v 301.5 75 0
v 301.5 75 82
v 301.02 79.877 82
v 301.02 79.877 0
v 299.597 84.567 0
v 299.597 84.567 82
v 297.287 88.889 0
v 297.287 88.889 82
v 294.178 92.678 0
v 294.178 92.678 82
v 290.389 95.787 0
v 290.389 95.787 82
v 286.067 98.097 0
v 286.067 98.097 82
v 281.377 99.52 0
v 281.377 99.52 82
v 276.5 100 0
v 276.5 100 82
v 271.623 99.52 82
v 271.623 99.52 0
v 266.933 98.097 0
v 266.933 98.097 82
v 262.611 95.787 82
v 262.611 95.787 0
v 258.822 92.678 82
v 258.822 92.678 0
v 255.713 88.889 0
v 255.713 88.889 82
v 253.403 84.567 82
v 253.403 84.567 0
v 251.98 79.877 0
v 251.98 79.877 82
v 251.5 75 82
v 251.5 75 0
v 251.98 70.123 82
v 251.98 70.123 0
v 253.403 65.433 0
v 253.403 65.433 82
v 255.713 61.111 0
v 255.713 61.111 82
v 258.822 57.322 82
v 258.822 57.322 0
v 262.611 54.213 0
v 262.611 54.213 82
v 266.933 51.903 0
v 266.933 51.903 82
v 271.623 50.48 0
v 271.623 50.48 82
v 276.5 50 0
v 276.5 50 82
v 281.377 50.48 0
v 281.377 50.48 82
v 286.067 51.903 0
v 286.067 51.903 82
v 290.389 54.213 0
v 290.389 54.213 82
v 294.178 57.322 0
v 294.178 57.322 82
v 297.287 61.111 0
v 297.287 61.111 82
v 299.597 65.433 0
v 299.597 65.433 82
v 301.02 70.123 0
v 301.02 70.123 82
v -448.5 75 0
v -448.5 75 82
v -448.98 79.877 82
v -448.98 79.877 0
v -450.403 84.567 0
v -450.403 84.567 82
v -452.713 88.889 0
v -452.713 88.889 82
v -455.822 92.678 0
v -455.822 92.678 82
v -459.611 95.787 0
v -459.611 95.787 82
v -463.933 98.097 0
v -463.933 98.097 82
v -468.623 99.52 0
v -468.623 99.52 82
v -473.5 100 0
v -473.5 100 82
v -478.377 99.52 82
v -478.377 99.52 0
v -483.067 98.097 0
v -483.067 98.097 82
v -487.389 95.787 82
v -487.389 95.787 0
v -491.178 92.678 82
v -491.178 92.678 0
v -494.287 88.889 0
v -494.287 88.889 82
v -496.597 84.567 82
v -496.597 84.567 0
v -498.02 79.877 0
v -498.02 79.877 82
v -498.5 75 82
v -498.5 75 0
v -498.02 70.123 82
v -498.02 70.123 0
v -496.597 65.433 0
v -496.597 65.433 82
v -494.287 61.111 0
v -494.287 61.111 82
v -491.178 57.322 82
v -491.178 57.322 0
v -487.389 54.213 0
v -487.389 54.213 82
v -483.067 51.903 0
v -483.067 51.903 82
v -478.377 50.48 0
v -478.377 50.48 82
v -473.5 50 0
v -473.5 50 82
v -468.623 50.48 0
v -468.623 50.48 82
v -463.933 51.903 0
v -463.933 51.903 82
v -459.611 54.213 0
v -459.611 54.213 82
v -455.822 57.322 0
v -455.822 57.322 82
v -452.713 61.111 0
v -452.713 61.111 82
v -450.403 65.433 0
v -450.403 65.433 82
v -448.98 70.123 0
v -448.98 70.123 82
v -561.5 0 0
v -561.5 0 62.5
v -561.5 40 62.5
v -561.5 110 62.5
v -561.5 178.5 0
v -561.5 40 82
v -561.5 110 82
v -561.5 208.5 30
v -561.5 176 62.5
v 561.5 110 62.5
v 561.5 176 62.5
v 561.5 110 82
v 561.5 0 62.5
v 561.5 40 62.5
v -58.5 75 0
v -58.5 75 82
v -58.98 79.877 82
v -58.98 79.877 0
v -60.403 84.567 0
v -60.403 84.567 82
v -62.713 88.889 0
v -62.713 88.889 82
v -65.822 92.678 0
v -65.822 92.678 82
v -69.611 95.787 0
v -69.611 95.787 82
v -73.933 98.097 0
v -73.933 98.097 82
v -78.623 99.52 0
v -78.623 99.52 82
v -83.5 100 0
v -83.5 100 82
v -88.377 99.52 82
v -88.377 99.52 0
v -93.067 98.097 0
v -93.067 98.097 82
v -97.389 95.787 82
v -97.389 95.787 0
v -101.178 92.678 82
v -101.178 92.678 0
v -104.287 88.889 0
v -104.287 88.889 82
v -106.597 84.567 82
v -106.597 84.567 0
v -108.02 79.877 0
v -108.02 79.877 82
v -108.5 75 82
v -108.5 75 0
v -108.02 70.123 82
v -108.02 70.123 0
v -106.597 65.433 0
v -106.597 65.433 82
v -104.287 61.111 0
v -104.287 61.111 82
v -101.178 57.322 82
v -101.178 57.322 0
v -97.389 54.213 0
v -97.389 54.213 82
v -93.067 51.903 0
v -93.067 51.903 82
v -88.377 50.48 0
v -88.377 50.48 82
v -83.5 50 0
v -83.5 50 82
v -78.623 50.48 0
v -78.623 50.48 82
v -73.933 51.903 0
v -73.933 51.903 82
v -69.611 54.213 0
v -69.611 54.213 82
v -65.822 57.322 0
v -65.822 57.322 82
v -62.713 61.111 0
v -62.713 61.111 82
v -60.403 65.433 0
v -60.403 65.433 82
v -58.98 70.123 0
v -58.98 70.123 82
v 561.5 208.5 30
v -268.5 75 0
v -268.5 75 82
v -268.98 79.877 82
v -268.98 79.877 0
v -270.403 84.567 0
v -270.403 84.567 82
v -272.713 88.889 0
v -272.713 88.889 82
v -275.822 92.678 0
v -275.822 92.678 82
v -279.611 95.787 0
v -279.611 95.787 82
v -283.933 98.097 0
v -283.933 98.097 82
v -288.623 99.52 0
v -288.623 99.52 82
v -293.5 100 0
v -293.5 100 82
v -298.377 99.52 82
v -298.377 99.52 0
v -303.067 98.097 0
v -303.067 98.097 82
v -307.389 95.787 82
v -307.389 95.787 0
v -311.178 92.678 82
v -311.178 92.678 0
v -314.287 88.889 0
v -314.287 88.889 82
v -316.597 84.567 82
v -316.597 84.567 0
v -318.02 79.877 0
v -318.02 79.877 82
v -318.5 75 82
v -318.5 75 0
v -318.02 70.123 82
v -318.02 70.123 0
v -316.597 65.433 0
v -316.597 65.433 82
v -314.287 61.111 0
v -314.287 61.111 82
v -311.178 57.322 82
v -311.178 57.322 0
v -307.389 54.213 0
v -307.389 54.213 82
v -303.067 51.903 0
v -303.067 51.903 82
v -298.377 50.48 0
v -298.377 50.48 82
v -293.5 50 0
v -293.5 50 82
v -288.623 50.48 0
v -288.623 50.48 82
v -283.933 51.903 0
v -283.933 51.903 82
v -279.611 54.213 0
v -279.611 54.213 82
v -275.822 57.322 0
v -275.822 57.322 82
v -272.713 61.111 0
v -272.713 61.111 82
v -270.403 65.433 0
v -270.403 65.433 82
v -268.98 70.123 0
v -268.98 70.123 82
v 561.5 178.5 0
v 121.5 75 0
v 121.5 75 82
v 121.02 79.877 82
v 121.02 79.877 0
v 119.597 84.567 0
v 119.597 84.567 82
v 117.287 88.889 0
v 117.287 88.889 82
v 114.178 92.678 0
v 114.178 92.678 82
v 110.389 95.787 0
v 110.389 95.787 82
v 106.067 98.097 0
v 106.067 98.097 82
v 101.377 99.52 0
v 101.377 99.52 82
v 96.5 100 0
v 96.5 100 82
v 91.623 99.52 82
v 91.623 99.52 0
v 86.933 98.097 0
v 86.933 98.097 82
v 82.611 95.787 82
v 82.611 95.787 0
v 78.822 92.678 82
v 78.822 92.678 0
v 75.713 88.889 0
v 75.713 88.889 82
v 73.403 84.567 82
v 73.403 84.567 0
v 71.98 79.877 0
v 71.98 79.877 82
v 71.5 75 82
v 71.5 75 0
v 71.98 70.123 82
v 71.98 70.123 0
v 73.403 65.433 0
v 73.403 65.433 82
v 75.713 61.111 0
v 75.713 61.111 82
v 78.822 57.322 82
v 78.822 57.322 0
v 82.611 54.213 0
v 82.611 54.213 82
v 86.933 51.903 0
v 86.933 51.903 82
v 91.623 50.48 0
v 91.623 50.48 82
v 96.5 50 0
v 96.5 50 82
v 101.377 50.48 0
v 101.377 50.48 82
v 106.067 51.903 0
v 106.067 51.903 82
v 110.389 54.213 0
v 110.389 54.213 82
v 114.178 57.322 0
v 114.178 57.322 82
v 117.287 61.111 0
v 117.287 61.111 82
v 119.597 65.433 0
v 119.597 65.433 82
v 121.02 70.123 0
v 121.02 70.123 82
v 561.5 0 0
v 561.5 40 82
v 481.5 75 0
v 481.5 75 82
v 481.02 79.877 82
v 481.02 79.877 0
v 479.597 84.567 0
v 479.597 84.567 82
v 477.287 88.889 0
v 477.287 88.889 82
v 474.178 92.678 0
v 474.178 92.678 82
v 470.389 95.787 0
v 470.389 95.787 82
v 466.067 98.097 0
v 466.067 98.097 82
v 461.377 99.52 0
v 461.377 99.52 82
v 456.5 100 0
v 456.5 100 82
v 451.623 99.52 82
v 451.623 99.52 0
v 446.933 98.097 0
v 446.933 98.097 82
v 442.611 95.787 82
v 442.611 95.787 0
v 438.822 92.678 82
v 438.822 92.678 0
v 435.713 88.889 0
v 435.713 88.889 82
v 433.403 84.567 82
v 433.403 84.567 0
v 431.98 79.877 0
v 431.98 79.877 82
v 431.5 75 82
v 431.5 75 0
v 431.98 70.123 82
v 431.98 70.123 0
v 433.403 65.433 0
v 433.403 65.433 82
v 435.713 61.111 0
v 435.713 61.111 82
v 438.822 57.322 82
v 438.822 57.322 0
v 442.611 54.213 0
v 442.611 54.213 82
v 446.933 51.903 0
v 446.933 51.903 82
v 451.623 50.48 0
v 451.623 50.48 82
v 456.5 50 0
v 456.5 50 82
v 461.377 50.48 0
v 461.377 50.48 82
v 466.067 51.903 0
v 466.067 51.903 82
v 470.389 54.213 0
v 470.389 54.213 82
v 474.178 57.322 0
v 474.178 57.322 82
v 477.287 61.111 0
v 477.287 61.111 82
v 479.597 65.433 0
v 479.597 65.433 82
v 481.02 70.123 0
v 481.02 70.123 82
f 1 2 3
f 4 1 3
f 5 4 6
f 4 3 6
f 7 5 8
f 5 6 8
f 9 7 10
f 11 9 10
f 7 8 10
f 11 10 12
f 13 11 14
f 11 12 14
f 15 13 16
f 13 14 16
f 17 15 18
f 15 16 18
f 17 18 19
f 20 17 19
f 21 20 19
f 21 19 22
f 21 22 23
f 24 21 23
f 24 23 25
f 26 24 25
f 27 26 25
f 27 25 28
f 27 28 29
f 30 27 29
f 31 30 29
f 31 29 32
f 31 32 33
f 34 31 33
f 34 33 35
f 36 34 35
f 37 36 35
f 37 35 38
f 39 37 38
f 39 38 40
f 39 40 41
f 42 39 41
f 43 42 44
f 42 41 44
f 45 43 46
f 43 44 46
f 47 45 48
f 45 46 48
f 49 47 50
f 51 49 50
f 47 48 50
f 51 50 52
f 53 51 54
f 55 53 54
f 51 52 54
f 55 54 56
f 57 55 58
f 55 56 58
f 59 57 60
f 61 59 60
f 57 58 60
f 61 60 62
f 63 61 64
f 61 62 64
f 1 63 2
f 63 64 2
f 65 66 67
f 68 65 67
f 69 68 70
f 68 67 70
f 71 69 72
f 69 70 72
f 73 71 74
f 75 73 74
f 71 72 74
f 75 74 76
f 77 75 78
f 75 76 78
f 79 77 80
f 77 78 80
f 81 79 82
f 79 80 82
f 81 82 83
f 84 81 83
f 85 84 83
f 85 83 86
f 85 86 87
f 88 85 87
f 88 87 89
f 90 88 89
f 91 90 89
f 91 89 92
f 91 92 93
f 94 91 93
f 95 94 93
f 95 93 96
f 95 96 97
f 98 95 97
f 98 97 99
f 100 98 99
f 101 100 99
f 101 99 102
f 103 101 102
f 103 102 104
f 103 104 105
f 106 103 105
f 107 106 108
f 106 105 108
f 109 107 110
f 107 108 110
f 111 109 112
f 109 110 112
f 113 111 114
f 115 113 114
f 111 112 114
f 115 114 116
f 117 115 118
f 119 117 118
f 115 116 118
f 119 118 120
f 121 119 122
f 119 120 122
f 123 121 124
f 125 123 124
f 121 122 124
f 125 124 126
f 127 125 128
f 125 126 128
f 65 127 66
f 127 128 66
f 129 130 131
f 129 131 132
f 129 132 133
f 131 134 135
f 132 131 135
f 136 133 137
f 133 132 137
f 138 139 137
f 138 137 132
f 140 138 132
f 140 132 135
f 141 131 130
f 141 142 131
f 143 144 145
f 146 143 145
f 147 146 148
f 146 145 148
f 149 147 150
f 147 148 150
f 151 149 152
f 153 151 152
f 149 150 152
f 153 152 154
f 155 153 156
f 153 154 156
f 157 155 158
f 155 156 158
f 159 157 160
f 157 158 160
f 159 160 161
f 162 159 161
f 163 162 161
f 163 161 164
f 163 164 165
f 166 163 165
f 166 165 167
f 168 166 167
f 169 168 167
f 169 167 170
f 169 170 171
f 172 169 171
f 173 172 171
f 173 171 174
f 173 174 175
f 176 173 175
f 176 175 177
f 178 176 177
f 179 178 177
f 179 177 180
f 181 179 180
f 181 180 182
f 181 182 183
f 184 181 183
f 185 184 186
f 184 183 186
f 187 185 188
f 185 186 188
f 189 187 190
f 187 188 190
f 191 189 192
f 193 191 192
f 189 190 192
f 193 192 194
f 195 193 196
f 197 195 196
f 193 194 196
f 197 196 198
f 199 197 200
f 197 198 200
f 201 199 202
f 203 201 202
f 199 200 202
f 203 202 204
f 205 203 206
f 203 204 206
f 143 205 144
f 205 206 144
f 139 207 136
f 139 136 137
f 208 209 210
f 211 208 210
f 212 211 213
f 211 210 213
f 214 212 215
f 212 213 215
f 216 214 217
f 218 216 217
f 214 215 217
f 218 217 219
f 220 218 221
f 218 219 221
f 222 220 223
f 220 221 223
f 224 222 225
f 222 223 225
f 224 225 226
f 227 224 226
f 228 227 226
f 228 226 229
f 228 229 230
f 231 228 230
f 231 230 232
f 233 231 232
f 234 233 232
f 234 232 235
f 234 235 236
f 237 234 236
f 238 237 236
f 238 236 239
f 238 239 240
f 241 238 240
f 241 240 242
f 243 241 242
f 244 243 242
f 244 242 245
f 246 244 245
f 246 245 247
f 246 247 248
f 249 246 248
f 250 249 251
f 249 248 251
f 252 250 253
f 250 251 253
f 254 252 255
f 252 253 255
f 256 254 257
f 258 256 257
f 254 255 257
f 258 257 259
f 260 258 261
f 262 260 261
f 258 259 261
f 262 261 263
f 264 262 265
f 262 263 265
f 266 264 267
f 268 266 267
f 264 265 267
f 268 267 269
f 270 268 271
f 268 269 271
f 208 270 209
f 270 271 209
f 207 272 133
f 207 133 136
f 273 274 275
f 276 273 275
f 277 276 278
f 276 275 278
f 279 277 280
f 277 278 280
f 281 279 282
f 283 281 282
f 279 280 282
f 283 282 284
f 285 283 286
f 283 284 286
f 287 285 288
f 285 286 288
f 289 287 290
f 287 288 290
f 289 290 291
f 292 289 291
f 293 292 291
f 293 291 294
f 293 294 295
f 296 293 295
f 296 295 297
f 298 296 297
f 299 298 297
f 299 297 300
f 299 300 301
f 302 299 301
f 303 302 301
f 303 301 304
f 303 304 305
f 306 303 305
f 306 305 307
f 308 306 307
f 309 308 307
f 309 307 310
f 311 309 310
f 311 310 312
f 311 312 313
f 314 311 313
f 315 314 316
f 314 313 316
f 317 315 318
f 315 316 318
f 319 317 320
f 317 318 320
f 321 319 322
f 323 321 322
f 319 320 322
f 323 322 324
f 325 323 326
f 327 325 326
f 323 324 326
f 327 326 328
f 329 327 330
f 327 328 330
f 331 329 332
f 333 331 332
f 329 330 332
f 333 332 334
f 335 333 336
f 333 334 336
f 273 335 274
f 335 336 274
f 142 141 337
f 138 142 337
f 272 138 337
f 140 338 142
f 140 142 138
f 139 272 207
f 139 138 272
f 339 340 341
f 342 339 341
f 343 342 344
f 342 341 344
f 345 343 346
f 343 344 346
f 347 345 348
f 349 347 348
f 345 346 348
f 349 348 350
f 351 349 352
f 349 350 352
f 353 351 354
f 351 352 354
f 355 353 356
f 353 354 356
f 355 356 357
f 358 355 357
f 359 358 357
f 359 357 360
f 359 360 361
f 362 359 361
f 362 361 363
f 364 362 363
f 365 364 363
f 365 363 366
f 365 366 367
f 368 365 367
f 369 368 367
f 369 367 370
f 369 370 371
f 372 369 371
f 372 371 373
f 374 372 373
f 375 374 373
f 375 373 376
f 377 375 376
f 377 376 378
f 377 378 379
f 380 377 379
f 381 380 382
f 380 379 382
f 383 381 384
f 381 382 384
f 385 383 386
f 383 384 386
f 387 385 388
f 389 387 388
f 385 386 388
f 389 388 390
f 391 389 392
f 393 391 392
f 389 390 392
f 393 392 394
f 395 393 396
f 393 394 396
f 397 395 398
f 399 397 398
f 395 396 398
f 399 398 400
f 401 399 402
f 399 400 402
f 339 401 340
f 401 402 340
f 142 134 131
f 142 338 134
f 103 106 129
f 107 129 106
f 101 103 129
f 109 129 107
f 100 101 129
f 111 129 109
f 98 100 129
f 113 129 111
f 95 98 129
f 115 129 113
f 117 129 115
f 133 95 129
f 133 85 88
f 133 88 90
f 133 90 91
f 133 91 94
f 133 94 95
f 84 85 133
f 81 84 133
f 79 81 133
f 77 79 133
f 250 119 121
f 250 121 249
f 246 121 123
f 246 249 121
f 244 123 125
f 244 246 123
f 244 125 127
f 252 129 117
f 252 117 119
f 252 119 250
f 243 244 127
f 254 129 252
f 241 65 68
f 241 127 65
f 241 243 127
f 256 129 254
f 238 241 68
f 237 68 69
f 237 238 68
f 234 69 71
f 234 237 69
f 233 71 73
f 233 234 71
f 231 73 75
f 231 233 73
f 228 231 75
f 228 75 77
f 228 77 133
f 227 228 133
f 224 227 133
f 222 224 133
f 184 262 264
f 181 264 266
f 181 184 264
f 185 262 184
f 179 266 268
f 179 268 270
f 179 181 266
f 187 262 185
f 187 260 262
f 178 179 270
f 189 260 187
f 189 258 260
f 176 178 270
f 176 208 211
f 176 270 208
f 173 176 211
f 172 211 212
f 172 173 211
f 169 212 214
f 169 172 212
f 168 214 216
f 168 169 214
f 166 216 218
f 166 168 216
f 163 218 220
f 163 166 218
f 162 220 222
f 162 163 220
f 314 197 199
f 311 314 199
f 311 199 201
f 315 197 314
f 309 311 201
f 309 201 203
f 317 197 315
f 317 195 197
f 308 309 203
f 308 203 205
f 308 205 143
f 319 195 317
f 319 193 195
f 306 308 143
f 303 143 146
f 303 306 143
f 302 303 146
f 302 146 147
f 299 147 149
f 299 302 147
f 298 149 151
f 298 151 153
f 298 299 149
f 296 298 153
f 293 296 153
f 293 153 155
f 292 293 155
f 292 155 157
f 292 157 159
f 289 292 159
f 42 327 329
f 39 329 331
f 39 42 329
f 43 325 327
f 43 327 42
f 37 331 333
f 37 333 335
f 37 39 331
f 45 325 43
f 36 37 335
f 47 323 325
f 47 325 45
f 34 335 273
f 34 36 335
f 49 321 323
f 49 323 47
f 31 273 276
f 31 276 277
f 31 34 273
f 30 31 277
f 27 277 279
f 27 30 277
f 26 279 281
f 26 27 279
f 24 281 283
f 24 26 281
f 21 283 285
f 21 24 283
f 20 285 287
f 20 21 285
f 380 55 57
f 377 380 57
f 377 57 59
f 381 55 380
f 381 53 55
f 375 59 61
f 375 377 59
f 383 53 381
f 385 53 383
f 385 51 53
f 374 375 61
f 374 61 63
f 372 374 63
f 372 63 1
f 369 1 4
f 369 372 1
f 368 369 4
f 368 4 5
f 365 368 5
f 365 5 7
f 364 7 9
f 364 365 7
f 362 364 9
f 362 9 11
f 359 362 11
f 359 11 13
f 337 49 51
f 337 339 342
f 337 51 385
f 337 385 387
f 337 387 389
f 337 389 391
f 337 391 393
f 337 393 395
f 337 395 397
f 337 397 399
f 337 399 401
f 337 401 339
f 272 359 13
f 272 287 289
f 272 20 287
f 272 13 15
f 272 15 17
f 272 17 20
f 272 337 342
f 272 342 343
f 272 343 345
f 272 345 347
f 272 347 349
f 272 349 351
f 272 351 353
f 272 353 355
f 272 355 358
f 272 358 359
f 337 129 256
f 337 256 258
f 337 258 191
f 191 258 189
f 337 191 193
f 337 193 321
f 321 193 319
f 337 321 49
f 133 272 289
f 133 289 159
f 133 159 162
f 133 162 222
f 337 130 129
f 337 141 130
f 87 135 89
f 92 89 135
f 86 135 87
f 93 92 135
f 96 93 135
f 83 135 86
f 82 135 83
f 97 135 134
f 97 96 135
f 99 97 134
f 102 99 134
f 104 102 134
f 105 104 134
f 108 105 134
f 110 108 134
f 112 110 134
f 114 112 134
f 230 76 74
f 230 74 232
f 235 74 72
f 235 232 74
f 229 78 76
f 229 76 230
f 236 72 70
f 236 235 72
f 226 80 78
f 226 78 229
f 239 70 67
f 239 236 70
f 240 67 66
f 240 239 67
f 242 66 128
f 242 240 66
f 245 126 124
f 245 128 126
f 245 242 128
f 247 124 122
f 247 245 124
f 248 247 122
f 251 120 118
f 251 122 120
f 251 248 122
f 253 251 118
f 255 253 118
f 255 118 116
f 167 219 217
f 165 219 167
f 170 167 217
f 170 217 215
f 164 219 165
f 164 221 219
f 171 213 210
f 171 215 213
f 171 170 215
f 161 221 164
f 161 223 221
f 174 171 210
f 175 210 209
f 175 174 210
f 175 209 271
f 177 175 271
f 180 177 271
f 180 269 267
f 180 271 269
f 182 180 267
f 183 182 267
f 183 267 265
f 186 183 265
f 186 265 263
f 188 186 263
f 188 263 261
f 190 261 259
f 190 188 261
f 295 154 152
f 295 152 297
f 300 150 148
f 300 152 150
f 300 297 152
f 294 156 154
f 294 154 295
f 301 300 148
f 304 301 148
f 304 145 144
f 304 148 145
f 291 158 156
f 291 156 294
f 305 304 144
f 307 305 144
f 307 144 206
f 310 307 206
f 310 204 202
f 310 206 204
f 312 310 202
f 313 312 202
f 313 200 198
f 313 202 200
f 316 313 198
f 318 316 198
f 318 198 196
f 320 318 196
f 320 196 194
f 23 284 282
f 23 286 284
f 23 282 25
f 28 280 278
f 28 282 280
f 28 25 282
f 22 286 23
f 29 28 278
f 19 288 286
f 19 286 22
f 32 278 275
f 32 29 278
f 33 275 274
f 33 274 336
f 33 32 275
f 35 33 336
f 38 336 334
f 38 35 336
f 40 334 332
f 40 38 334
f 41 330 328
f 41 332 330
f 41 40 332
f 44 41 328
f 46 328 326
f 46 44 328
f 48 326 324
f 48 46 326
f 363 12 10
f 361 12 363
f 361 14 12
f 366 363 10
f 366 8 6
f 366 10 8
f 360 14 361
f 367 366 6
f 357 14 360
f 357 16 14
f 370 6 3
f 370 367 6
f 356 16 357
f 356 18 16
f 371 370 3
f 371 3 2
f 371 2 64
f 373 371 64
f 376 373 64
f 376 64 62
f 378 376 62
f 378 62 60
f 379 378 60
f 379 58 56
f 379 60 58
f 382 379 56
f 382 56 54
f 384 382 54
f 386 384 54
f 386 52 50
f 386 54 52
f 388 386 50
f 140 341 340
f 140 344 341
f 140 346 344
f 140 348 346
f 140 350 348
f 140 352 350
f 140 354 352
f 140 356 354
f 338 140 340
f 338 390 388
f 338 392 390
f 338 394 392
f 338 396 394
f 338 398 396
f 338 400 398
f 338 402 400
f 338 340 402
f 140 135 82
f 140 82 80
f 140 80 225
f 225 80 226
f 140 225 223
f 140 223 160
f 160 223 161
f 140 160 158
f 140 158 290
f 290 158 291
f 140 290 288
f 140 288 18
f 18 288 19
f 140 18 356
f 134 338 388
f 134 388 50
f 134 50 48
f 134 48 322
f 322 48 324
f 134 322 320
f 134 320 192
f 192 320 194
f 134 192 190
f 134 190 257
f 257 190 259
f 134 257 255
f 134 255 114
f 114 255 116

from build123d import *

# Parameters (mm, degrees)
F1_DEPTH = 561.5
F2_R     = 25
F3_DEPTH = 82.001


with BuildPart() as f1:
    # F0 (on Right) → F1 (new body, symmetric)
    with BuildSketch(Plane.YZ):
        Polygon((0, 62.5), (0, 0), (178.5, 0), (208.5, 30), (176, 62.5), (110, 62.5), (110, 82), (40, 82), (40, 62.5), align=None)
    extrude(amount=F1_DEPTH, both=True)

    # F2 (on face) → F3 (cut, through all)
    with BuildSketch(Plane.XY.offset(82)):
        with Locations((456.5, 75)):
            Circle(F2_R)
        with Locations((276.5, 75)):
            Circle(F2_R)
        with Locations((96.5, 75)):
            Circle(F2_R)
        with Locations((-83.5, 75)):
            Circle(F2_R)
        with Locations((-293.5, 75)):
            Circle(F2_R)
        with Locations((-473.5, 75)):
            Circle(F2_R)
    extrude(amount=-F3_DEPTH, mode=Mode.SUBTRACT)


solid = f1.part
